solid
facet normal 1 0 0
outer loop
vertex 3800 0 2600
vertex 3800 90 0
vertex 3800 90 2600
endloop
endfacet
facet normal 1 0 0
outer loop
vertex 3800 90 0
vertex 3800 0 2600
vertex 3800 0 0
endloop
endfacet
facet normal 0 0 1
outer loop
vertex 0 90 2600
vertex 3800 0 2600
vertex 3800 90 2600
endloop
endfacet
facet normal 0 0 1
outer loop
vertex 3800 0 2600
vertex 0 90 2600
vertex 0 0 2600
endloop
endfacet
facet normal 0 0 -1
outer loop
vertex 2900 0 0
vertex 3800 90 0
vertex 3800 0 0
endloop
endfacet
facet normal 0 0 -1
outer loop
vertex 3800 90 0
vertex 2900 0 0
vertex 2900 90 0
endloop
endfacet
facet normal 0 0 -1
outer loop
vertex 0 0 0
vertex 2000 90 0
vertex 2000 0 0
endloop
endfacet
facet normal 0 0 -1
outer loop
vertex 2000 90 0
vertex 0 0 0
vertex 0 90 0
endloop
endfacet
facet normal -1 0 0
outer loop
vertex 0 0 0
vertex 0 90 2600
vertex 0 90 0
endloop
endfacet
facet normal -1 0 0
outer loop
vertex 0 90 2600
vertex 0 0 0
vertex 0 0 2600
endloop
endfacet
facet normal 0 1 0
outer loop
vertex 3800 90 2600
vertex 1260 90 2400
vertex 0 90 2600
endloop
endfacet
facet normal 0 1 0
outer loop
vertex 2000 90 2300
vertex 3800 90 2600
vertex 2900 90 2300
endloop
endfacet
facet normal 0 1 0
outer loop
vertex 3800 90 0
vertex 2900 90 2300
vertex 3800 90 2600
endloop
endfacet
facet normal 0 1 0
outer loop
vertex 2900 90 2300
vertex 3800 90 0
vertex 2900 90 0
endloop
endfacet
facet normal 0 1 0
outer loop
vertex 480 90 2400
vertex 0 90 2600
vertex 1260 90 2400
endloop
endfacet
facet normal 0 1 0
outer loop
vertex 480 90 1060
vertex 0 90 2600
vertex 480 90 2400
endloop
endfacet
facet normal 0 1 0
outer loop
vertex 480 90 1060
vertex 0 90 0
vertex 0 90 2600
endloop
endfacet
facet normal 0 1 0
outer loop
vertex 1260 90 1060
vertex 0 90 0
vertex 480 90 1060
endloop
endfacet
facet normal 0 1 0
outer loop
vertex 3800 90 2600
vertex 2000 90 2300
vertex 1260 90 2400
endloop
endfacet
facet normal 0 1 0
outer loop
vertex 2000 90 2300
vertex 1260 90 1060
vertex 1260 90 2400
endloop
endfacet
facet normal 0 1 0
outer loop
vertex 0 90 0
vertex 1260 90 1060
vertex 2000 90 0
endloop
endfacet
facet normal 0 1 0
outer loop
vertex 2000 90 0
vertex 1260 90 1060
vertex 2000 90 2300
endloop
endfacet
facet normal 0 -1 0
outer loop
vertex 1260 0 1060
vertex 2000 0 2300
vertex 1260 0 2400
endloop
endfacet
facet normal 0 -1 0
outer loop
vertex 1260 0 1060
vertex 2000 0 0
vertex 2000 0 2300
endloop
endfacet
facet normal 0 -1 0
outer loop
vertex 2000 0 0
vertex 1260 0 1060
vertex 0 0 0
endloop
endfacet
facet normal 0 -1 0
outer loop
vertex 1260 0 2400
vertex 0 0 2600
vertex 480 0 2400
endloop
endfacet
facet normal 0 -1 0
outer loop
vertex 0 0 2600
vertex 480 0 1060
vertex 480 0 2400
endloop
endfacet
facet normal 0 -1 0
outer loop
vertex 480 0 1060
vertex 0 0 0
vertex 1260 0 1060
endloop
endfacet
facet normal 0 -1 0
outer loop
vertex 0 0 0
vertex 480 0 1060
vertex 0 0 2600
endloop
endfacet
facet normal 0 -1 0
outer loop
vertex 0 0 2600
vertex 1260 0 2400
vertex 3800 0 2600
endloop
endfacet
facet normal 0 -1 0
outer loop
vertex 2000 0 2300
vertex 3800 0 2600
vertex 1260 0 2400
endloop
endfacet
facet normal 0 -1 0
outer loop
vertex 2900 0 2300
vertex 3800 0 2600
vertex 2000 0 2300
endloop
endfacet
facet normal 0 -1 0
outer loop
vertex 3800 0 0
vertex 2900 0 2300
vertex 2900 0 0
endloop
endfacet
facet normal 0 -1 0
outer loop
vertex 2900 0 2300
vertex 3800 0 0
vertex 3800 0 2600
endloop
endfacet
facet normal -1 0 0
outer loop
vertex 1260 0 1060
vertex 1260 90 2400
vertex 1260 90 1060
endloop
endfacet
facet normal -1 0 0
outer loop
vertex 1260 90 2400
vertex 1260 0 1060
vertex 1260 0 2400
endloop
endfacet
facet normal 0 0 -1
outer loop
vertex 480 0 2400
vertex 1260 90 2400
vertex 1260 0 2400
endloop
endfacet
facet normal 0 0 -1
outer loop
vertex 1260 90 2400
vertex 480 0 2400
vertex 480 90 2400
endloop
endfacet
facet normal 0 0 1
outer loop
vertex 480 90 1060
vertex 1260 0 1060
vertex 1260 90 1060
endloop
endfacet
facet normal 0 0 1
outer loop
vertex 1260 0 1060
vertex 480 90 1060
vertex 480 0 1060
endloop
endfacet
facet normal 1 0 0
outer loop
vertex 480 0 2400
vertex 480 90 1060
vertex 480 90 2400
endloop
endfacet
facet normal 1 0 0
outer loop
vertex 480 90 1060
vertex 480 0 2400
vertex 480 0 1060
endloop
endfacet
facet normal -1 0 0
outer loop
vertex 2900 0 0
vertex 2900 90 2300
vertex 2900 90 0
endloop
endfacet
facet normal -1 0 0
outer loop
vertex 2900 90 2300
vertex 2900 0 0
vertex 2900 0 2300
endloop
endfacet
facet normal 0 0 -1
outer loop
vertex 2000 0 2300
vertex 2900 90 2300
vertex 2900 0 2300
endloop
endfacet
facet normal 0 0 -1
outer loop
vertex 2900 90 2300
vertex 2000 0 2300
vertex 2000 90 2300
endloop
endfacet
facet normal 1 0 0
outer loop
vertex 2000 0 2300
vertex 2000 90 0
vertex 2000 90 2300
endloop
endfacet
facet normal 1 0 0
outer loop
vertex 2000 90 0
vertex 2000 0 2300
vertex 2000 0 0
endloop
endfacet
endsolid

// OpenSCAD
// file: ../project_components/rear_wall.scad
//
// Project component: garage rear wall with window and door openings.
// Garage interior is on negative Y.
// Exterior wall side is positive Y.
//

module rear_wall(
    width,
    height,
    thickness,
    window_x,
    window_z,
    window_width,
    window_height,
    door_x,
    door_width,
    door_height
) {
    difference() {
        cube([width, thickness, height]);

        // Window opening
        translate([window_x, -1, window_z])
            cube([
                window_width,
                thickness + 2,
                window_height
            ]);

        // Door opening
        translate([door_x, -1, 0])
            cube([
                door_width,
                thickness + 2,
                door_height
            ]);
    }
}
// file: ../config.scad
//
// Garage layout - configuration
// Units: millimetres
//

$fn = 48;


/* [View] */

show_rear_wall           = true;
show_left_wall           = true;
show_window_frame        = true;
show_door_frame          = true;
show_window_sill         = true;
show_workbench           = true;
show_floor               = true;
show_tool_backing_panels = true;
show_skadis_panels       = true;
show_tool_panel_mounts   = true;
show_skadis_slot_pattern = true;
show_skadis_mount_points = true;
show_skadis_mount_hardware = false;

// Move multiplex + SKADIS towards the garage to inspect the concealed mount.
tool_panel_explode = 0; // [0:5:150]


/* [Garage walls] */

wall_width     = 3800;
wall_height    = 2600;

// Concrete / structural inner shell only.
// Additional exterior wall layers can be added later.
wall_thickness = 90;

// Temporary left-wall depth follows the currently modelled floor depth.
// This will become the measured garage depth later.
left_wall_depth = 2000;


/* [Window opening] */

// Inside view: measured from the left side of the rear wall.
window_left_offset = 480;
window_width       = 780;
window_height      = 1340;
window_top_offset  = 200;

window_bottom = wall_height - window_top_offset - window_height;


/* [Window sill] */

// Projection into the garage from the inside face of the wall.
window_sill_thickness  = 20;
window_sill_depth      = 20;
window_sill_side_extra = 20;


/* [Door opening] */

// Horizontal distance between the right side of the window opening
// and the left side of the door opening.
window_to_door = 740;

// Width is provisional until measured.
door_width  = 900;
door_height = 2300;

door_left = window_left_offset + window_width + window_to_door;


/* [Exterior frames] */

// Simplified visualization. Both frames sit on the exterior side
// of the 90 mm concrete wall.
frame_border = 50;
frame_depth  = 60;


/* [Workbench] */

workbench_width  = 1500;
workbench_depth  = 750;
workbench_height = 990;

workbench_top_thickness = 40;
workbench_leg_size      = 70;
workbench_leg_inset     = 60;

// Inside view: workbench starts at the left end of the rear wall.
workbench_x = 0;


/* [Tool panel backing] */

// Use the 1220 mm sheet dimension directly. The backing panels are centred
// vertically on the window opening instead of being made as tall as the window.
tool_panel_height = 1220;
tool_panel_bottom = window_bottom + (window_height - tool_panel_height) / 2;
tool_panel_top    = tool_panel_bottom + tool_panel_height;

tool_panel_thickness = 18;

// Left wall strip is 480 mm; keep 10 mm free on each side.
left_tool_panel_width = 460;
left_tool_panel_x = (window_left_offset - left_tool_panel_width) / 2;

// Right wall strip between window and door is 740 mm; keep 10 mm each side.
right_tool_panel_width = 720;
right_tool_panel_x =
    window_left_offset + window_width
    + (window_to_door - right_tool_panel_width) / 2;


/* [SKADIS] */

skadis_width  = 360;
skadis_height = 560;
skadis_thickness = 5;

// Approximate stand-off created by the original IKEA wall rail/spacers.
skadis_mount_gap = 15;

// Geometry used for the recognisable SKADIS pattern.
skadis_corner_radius = 9;
skadis_slot_width    = 5;
skadis_slot_height   = 15;
skadis_grid_pitch    = 40;
skadis_grid_offset   = 20;

// The 36 cm board uses the supplied 20 cm wall rail. The four visible board
// fasteners are modelled at the corresponding left/right positions.
skadis_rail_length = 200;
skadis_mount_point_z_inset = 20;
skadis_mount_head_diameter = 12;
skadis_mount_head_depth = 2;


/* [Tool panel mounting - Ropro] */

// Ropro Heavy Duty French Cleat / Z-bar known dimensions.
cleat_profile_height = 38;
cleat_wall_distance  = 6;

// Route the full wall-rail envelope into the back of the 18 mm multiplex.
// This leaves 12 mm of multiplex below the recess and must be considered
// when selecting screws for the panel-side counter profile.
cleat_recess_depth = 6;
cleat_recess_clearance = 1;

// Position rail near the upper edge, safely above the panel centre of gravity.
cleat_top_inset = 50;

// Left panel: Ropro Heavy Duty 30 cm set (300 + 300 mm).
left_cleat_wall_length  = 300;
left_cleat_panel_length = 300;

// Right panel: Ropro Heavy Duty 60+6 cm set:
// 600 mm wall rail + two 60 mm panel-side counter profiles.
right_cleat_wall_length = 600;
right_cleat_panel_piece_length = 60;


/* [Floor] */

// Temporary depth until the complete garage depth is measured.
floor_depth     = 2000;
floor_thickness = 100;
// main file
// Export entry point: concrete rear wall only

include <../config.scad>
include <../project_components/rear_wall.scad>

rear_wall(
    width         = wall_width,
    height        = wall_height,
    thickness     = wall_thickness,
    window_x      = window_left_offset,
    window_z      = window_bottom,
    window_width  = window_width,
    window_height = window_height,
    door_x        = door_left,
    door_width    = door_width,
    door_height   = door_height
);
